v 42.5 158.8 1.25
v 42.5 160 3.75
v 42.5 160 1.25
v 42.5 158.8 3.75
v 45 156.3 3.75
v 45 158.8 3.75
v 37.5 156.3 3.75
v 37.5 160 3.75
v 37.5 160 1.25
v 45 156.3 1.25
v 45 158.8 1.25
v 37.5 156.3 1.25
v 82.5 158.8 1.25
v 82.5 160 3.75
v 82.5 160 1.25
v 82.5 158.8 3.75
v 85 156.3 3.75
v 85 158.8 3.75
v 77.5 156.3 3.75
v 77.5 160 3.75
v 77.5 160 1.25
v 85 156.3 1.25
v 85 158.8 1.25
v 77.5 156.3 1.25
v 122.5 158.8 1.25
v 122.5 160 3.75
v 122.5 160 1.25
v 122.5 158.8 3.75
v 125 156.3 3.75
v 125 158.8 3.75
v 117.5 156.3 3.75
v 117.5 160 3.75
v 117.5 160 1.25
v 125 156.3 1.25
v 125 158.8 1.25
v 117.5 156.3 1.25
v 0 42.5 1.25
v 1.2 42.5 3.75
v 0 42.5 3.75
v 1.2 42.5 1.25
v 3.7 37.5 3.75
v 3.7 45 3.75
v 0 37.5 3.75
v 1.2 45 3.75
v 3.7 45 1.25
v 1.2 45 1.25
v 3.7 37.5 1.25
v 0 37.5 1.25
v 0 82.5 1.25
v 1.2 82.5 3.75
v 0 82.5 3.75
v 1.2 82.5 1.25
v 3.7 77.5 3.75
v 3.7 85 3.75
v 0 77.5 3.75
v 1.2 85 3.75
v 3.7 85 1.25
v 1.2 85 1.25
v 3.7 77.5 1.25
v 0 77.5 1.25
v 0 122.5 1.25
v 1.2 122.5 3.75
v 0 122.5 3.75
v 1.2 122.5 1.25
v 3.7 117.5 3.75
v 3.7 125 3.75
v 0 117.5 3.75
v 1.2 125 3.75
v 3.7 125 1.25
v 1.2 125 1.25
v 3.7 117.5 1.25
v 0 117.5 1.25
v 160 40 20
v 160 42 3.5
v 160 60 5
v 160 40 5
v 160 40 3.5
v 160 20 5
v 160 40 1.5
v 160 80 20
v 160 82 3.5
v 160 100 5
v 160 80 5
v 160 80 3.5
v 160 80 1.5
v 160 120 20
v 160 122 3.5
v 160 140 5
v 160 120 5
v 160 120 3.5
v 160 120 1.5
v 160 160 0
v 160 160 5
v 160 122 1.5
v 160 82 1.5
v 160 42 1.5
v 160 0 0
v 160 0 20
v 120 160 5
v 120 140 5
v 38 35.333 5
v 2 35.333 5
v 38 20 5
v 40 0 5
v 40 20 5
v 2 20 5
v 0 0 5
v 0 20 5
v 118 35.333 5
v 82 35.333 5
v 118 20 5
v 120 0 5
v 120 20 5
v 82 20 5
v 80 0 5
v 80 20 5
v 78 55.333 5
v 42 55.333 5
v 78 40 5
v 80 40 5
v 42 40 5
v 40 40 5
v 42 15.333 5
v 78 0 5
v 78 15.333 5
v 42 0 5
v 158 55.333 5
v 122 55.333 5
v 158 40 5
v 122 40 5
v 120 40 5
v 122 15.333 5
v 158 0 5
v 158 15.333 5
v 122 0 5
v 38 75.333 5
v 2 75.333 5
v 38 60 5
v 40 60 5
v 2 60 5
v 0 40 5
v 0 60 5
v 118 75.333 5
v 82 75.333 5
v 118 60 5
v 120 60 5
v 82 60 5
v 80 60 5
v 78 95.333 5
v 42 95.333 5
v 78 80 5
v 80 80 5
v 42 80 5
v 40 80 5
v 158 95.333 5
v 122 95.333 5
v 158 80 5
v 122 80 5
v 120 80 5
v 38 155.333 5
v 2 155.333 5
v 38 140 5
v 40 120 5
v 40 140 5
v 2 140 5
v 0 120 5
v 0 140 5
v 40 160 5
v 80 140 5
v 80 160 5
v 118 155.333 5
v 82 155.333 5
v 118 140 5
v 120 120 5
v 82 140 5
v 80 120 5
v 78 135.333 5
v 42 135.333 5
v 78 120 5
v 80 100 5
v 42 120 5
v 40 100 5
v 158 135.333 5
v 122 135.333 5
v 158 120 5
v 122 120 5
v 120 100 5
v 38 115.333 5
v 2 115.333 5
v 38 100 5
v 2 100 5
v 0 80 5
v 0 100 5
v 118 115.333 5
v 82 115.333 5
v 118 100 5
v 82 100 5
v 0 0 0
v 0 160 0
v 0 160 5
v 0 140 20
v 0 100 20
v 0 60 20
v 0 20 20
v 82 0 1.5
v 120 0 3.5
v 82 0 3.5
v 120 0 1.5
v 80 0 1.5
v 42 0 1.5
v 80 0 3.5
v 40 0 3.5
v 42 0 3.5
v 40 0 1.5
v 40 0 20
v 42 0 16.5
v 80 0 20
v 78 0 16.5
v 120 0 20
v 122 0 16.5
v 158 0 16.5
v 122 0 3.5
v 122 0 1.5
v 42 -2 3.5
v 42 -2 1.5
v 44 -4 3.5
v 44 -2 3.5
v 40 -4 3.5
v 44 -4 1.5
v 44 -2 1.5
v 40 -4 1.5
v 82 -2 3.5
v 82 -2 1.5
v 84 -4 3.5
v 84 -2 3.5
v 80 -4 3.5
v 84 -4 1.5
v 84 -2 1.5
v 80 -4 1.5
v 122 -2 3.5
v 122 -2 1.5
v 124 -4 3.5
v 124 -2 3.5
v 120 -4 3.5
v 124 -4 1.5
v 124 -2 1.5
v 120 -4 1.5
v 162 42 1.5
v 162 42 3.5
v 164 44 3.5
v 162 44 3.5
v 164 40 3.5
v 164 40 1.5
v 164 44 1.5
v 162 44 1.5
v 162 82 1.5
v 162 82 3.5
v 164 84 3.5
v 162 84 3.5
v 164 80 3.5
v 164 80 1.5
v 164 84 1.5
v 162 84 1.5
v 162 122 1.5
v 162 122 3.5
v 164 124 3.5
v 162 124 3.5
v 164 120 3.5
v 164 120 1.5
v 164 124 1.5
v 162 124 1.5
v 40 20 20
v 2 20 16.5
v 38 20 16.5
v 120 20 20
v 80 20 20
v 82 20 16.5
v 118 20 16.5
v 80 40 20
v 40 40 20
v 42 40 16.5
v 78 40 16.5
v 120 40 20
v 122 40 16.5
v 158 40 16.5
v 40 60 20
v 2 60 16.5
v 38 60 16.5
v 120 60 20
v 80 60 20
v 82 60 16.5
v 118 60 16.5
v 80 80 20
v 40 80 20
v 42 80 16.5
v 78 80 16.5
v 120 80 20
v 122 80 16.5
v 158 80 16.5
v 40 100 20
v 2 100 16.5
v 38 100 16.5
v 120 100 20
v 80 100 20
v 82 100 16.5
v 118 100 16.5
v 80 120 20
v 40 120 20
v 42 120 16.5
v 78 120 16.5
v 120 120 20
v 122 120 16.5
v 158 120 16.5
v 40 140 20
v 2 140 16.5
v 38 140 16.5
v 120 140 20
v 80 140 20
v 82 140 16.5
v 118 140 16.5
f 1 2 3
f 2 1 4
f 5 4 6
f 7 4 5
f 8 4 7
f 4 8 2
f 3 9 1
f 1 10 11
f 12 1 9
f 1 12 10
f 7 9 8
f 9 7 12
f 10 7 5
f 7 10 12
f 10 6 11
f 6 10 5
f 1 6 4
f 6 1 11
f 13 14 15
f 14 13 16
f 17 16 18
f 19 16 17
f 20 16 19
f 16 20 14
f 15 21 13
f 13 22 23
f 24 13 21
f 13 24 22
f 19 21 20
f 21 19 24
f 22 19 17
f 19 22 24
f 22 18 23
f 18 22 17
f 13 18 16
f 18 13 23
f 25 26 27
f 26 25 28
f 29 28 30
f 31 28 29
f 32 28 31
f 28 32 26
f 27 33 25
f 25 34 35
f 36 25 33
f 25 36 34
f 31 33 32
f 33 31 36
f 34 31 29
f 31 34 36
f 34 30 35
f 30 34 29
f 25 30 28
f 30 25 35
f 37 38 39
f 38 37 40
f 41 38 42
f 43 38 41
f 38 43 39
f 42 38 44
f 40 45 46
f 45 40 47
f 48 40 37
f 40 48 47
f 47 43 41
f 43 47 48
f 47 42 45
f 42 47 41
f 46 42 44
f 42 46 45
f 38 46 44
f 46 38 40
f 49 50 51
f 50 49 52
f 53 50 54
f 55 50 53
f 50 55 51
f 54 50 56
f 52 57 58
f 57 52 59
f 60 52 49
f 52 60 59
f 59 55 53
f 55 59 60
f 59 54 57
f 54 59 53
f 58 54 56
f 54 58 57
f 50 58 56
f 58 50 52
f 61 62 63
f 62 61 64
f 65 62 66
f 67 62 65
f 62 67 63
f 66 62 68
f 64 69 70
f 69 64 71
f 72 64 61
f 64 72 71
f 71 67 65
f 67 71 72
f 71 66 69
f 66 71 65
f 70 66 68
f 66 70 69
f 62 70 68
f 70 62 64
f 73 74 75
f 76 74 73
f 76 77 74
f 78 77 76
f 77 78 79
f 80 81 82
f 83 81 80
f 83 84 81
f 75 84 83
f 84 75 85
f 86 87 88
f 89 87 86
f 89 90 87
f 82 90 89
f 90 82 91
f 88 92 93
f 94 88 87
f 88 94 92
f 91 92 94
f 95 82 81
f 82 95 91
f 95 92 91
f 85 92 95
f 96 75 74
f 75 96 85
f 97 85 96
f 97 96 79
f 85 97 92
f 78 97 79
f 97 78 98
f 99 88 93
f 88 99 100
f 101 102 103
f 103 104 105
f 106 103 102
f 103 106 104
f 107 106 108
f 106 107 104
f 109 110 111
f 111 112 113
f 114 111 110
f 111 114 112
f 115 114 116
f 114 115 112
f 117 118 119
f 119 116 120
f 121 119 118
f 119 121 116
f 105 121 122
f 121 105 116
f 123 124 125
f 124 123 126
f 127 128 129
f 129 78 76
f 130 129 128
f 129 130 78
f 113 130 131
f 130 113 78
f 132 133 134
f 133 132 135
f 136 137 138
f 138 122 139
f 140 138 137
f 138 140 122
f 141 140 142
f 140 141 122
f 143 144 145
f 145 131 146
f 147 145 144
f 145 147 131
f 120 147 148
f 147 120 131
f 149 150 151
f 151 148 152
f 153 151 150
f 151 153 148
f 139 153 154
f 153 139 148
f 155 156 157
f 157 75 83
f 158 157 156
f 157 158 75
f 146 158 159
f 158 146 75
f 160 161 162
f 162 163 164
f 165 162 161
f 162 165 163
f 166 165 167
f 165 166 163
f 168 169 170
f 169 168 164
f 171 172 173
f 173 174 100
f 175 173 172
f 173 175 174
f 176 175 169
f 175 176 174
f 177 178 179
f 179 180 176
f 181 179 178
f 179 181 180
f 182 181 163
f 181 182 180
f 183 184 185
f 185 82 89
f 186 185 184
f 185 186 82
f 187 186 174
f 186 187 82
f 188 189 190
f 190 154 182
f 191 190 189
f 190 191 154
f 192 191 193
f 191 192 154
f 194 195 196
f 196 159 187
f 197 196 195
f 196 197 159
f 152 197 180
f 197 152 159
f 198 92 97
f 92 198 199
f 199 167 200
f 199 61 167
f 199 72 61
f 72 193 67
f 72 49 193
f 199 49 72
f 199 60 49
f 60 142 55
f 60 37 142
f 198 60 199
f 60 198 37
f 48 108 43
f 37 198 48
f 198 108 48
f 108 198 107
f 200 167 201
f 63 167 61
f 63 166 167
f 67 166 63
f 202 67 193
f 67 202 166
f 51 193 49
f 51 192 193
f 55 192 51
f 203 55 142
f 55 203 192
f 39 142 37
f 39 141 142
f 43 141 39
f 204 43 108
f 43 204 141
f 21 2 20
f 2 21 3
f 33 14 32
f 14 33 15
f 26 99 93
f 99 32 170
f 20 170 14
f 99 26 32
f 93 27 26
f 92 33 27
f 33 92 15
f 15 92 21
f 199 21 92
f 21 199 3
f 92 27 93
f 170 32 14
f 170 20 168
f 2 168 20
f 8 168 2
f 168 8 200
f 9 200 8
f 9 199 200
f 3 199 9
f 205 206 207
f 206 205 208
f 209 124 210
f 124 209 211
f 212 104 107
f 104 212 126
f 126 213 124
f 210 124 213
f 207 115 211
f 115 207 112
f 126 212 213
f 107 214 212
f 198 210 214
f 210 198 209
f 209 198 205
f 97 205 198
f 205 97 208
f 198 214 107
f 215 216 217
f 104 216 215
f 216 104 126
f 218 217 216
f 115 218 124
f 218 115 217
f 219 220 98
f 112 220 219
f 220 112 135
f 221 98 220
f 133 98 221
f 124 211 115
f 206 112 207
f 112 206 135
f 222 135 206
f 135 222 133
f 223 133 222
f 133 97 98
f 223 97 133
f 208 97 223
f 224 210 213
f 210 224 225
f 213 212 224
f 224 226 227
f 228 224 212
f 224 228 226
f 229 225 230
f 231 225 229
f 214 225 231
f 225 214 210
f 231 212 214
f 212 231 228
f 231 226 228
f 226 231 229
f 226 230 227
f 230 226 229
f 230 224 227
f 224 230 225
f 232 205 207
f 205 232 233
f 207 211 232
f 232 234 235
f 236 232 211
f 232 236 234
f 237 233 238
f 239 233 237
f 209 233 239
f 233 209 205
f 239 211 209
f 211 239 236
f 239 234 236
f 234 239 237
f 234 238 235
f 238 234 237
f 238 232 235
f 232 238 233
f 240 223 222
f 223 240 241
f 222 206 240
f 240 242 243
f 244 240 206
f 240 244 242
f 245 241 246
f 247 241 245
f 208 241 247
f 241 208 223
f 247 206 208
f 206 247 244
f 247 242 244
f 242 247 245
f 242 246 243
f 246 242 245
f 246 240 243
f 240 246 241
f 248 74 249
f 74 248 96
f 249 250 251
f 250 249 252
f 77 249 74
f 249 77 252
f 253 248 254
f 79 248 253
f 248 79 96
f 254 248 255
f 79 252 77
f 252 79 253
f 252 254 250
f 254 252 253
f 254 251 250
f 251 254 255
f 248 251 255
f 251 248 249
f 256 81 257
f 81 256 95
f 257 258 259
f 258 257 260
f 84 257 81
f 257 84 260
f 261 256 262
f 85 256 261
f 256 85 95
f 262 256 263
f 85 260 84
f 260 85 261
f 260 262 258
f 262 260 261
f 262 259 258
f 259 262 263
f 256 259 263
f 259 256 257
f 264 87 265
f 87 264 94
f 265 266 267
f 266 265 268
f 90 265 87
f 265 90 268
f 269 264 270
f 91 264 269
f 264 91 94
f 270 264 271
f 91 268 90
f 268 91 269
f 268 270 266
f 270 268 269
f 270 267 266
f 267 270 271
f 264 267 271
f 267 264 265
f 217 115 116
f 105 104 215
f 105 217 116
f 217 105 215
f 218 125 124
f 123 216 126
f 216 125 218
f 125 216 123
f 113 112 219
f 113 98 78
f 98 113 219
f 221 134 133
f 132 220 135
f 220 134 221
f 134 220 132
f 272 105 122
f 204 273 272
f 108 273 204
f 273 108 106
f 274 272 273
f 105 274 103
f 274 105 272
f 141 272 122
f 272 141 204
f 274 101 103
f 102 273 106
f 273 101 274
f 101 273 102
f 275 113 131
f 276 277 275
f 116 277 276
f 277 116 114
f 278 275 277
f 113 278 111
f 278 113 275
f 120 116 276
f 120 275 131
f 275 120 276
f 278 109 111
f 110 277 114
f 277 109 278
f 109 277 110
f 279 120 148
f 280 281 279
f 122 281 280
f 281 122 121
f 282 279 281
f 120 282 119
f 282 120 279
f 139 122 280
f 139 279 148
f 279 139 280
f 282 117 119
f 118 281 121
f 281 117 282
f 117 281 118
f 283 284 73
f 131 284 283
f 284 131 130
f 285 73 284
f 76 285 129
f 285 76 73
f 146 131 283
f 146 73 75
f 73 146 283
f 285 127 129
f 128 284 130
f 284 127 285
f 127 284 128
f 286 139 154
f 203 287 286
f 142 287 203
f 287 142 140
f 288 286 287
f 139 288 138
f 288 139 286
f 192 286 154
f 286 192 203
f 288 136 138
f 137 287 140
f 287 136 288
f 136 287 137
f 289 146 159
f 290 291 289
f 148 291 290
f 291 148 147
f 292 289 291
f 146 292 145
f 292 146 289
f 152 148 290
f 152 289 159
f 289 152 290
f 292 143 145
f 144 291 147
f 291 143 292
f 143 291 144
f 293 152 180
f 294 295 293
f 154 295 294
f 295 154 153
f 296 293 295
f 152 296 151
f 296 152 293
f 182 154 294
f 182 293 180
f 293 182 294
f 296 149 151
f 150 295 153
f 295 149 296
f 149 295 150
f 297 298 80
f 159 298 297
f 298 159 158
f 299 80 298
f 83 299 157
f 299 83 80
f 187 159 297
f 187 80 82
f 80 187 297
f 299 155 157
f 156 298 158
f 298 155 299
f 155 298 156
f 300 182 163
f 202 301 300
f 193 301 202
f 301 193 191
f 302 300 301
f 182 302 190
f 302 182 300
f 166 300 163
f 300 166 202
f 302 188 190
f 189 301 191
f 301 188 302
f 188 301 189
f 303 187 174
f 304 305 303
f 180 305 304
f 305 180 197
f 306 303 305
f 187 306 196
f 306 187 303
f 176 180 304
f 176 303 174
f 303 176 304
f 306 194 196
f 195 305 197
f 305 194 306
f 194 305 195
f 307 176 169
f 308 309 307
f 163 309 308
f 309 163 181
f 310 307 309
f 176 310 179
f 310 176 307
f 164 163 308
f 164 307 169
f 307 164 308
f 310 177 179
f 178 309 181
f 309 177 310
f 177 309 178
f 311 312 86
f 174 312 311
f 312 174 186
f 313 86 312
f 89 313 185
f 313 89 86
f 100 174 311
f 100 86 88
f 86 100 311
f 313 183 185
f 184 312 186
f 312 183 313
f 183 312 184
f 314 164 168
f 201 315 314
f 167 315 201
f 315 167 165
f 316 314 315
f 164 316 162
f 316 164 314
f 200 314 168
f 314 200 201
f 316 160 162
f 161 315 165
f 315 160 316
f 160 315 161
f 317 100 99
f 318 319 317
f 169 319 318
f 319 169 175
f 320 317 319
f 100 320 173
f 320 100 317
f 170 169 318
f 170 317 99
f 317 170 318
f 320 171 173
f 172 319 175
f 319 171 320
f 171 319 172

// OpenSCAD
/* [Wall] */
wallWidth = 160;
wallHeight = 160;

/* [Wall parts] */
wallPartWidth = 160;
assert(wallPartWidth > 0 && wallPartWidth <= wallWidth);
wallPartHeight = 160;
assert(wallPartHeight > 0 && wallPartHeight <= wallHeight);
wallPartThickness = 5;
assert(wallPartThickness > 0);

/* [Plant box] */
plantBoxWidth = 40;
plantBoxHeight = 20;
plantBoxDepth = 15;
plantBoxWallThickness = 2;

/* Edges  */
edgePartSize = [
	wallWidth - floor(wallWidth/wallPartWidth) * wallPartWidth,
	wallHeight - floor(wallHeight/wallPartHeight) * wallPartHeight,
	wallPartThickness
];

/* [Hooks] */
edgeNumberOfXHooks = wallPartWidth/edgePartSize[0] > 4 ? 1 : (wallPartWidth/edgePartSize[0] > 2 ? 2 : 3);
edgeNumberOfYHooks = wallPartHeight/edgePartSize[1] > 4 ? 1 : (wallPartHeight/edgePartSize[1] > 2 ? 2 : 3);


hookWidth = 4;
assert(hookWidth > 0 && hookWidth < wallPartWidth/4 && hookWidth < wallPartHeight/4);
hookHeight = 4;
assert(hookHeight > 0);
hookThickness = 2;
assert(hookThickness < wallPartThickness);
hookFitSpacingRate = 1.25;
hookWallSpacingRate = 0.925;
assert(
	hookThickness * hookFitSpacingRate < wallPartThickness &&
	hookWidth * hookFitSpacingRate < wallPartWidth/(edgeNumberOfXHooks + 1) &&
	hookHeight * hookFitSpacingRate < wallPartHeight/(edgeNumberOfXHooks + 1)
);
wallPartNumberOfXHooks = 3;
assert(wallPartNumberOfXHooks > 0);
wallPartNumberOfYHooks = 3;
assert(wallPartNumberOfYHooks > 0);


/* [Edges] */
assert(edgePartSize[0] == 0 || (edgePartSize[0] > hookWidth && edgePartSize[0] > hookHeight));
assert(edgePartSize[1] == 0 || (edgePartSize[1] > hookWidth && edgePartSize[1] > hookHeight));

// Spacing between wall parts
wallPartSpacing = hookHeight * 2;
assert(hookHeight < wallPartSpacing);


for (yIndex = [0:floor(wallHeight/wallPartHeight) - 1]) {
	for(xIndex = [0:floor(wallWidth/wallPartWidth) - 1]) {
		translate([
			xIndex * (wallPartWidth + wallPartSpacing),
			yIndex * (wallPartHeight + wallPartSpacing),
			0
		])
		union() {
			difference() {
				// Wall part
				cube([
					wallPartWidth,
					wallPartHeight,
					wallPartThickness
				]);
				
				/* Inner Hook */
				// Hook X
				for (hookIndex = [1:wallPartNumberOfXHooks]) {
					translate([
						wallPartWidth / (wallPartNumberOfXHooks + 1) * hookIndex - (hookWidth * hookFitSpacingRate) / 2,
						wallPartHeight - hookHeight * hookWallSpacingRate,
						wallPartThickness/2 - (hookThickness*hookFitSpacingRate) / 2
					])
					scale([hookFitSpacingRate,hookFitSpacingRate,hookFitSpacingRate])
					union() {
						cube([
							hookWidth,
							hookHeight,
							hookThickness
						]);
						cube([
							hookWidth * 1.5,
							hookHeight/2,
							hookThickness
						]);
					}
				}
				// Hook Y
				for (hookIndex = [1:wallPartNumberOfYHooks]) {
					translate([
						hookHeight * hookWallSpacingRate,
						wallPartHeight / (wallPartNumberOfYHooks + 1) * hookIndex - (hookWidth * hookFitSpacingRate)/2,
						wallPartThickness/2 - (hookThickness * hookFitSpacingRate) / 2
					])
					scale([hookFitSpacingRate,hookFitSpacingRate,hookFitSpacingRate])
					rotate(90)
					union() {
						cube([
							hookWidth,
							hookHeight,
							hookThickness
						]);
						cube([
							hookWidth * 1.5,
							hookHeight/2,
							hookThickness
						]);
					}
				}
				
			}
			
			/* Outer Hook */
			// Hook X
			for (hookIndex = [1:wallPartNumberOfXHooks]) {
				translate([
					wallPartWidth / (wallPartNumberOfXHooks + 1) * hookIndex,
					-hookHeight,
					wallPartThickness/2 - hookThickness / 2
				])
				union() {
					cube([
						hookWidth/2,
						hookHeight,
						hookThickness
					]);
					cube([
						hookWidth,
						hookHeight/2,
						hookThickness
					]);
				}
			}
			// Hook Y
			for (hookIndex = [1:wallPartNumberOfYHooks]) {
				translate([
					wallPartWidth + hookHeight,
					wallPartHeight / (wallPartNumberOfYHooks + 1) * hookIndex,
					wallPartThickness/2 - hookThickness / 2
				])
				rotate(90)
				union() {
					cube([
						hookWidth/2,
						hookHeight,
						hookThickness
					]);
					cube([
						hookWidth,
						hookHeight/2,
						hookThickness
					]);
				}
			}
			
			// Plant Boxes
			yBoxesCount = floor(wallPartHeight / plantBoxHeight);
			xBoxesCount = floor(wallPartWidth / (plantBoxWidth * 2));
			for(rowBoxIndex = [0:yBoxesCount - 1]) {
				for(columnBoxIndex = [0:xBoxesCount - 1]) {
					xSpace = (wallPartWidth - plantBoxWidth * (xBoxesCount * 2)) / (xBoxesCount * 2);
					ySpace = (wallPartHeight - plantBoxHeight * yBoxesCount) / yBoxesCount;

					translate([
						(plantBoxWidth + xSpace) * columnBoxIndex * 2 + (rowBoxIndex % 2 == 0 ? plantBoxWidth + xSpace: 0) + xSpace/2 ,
						(plantBoxHeight + ySpace) * rowBoxIndex + ySpace/2,
						wallPartThickness
					])
					difference() {
//						cube([
//							plantBoxWidth,
//							plantBoxHeight,
//							plantBoxDepth
//						]);
						
						faces = [
						  [0,1,2,3],  // bottom
						  [4,5,1,0],  // front
						  [7,6,5,4],  // top
						  [5,6,2,1],  // right
						  [6,7,3,2],  // back
						  [7,4,0,3]
						 ];

						polyhedron(
							points=[
							  [0, 0, 0],
							  [plantBoxWidth, 0, 0],
							  [plantBoxWidth, plantBoxHeight, 0],
							  [0, plantBoxHeight, 0],
							  [0, 0, plantBoxDepth],
							  [plantBoxWidth, 0, plantBoxDepth],
							  [plantBoxWidth, 0, plantBoxDepth],
							  [0, 0, plantBoxDepth]
							],
							faces=faces
						);
						
						phW = plantBoxWidth - plantBoxWallThickness * 2;
						translate([
							plantBoxWallThickness,
							-plantBoxWallThickness,
							-plantBoxWallThickness
						])
						polyhedron(
							points=[
							  [0, 0, 0],
							  [phW, 0, 0],
							  [phW, plantBoxHeight, 0],
							  [0, plantBoxHeight, 0],
							  [0, 0, plantBoxDepth],
							  [phW, 0, plantBoxDepth],
							  [phW, 0, plantBoxDepth],
							  [0, 0, plantBoxDepth]
							],
							faces=faces
						);
						
//						translate([
//							plantBoxWallThickness,
//							0,
//							0
//						])
//						cube([
//							plantBoxWidth - plantBoxWallThickness * 2,
//							plantBoxHeight - plantBoxWallThickness * 2,
//							plantBoxDepth - plantBoxWallThickness
//						]);
						
						
					}
				}
			}
		}
	}
}

// Edge Parts Y
if (wallWidth % wallPartWidth != 0) {
	for (yIndex = [0:floor(wallHeight/wallPartHeight) - 1]) {
		partSize = [
			wallWidth - floor(wallWidth/wallPartWidth) * wallPartWidth,
			wallPartHeight,
			wallPartThickness
		];
		
		translate([-wallPartWidth,0,0])
		union() {
			difference() {
				translate([
					0,
					yIndex * (wallPartHeight + wallPartSpacing),
					0
				])
				cube(partSize);
				
				// Inner hook for wall parts
				for (hookIndex = [1:wallPartNumberOfYHooks]) {
					translate([
						hookHeight * hookWallSpacingRate,
						(wallPartHeight + wallPartSpacing) * yIndex + wallPartHeight / (wallPartNumberOfYHooks + 1) * hookIndex - (hookWidth * hookFitSpacingRate)/2,
						wallPartThickness/2 - (hookThickness * hookFitSpacingRate) / 2
					])
					scale([hookFitSpacingRate,hookFitSpacingRate,hookFitSpacingRate])
					rotate(90)
					union() {
						cube([
							hookWidth,
							hookHeight,
							hookThickness
						]);
						cube([
							hookWidth * 1.5,
							hookHeight/2,
							hookThickness
						]);
					}
				}
				
				// inner hook for edge part
				for (hookIndex = [1:edgeNumberOfXHooks]) {
					translate([
						partSize[0] / (edgeNumberOfXHooks + 1) * hookIndex - (hookWidth * hookFitSpacingRate) / 2,
						partSize[1] - hookHeight * hookWallSpacingRate,
						wallPartThickness/2 - (hookThickness*hookFitSpacingRate) / 2
					])
					scale([hookFitSpacingRate,hookFitSpacingRate,hookFitSpacingRate])
					union() {
						cube([
							hookWidth,
							hookHeight,
							hookThickness
						]);
						cube([
							hookWidth * 1.5,
							hookHeight/2,
							hookThickness
						]);
					}
				}
			}
			
			// Outer hook
			for (hookIndex = [1:edgeNumberOfXHooks]) {
				translate([
					partSize[0] / (edgeNumberOfXHooks + 1) * hookIndex,
					yIndex * (wallPartHeight + wallPartSpacing) + (-hookHeight),
					wallPartThickness/2 - hookThickness / 2
				])
				union() {
					cube([
						hookWidth/2,
						hookHeight,
						hookThickness
					]);
					cube([
						hookWidth,
						hookHeight/2,
						hookThickness
					]);
				}
			}
		}
	}
}

// Edge Parts X
if (wallHeight % wallPartHeight != 0) {
	for (xIndex = [0:floor(wallWidth/wallPartWidth) - 1]) {
		partSize = [
			wallPartWidth,
			wallHeight - floor(wallHeight/wallPartHeight) * wallPartHeight,
			wallPartThickness
		];
		
		translate([0,-wallPartHeight,0])
		union() {
			difference() {
				translate([
					xIndex * (wallPartWidth + wallPartSpacing),
					0,
					0
				])
				cube(partSize);

				// Inner hook X
				for (hookIndex = [1:wallPartNumberOfXHooks]) {
					translate([
						wallPartWidth / (wallPartNumberOfXHooks + 1) * hookIndex - hookWidth / 2 + xIndex * (wallPartWidth + wallPartSpacing),
						wallHeight - floor(wallHeight/wallPartHeight) * wallPartHeight - hookHeight * hookWallSpacingRate,
						wallPartThickness/2 - (hookThickness*hookFitSpacingRate) / 2
					])
					scale([hookFitSpacingRate,hookFitSpacingRate,hookFitSpacingRate])
					union() {
						cube([
							hookWidth,
							hookHeight,
							hookThickness
						]);
						cube([
							hookWidth * 1.5,
							hookHeight/2,
							hookThickness
						]);
					}
				}
				
				// Inner hook Y
				for (hookIndex = [1:edgeNumberOfYHooks]) {
					translate([
						(partSize[0] + wallPartSpacing) * xIndex + hookHeight * hookWallSpacingRate,
						partSize[1] / (edgeNumberOfYHooks + 1) * hookIndex - (hookWidth * hookFitSpacingRate)/2,
						wallPartThickness/2 - (hookThickness * hookFitSpacingRate) / 2
					])
					scale([hookFitSpacingRate,hookFitSpacingRate,hookFitSpacingRate])
					rotate(90)
					union() {
						cube([
							hookWidth,
							hookHeight,
							hookThickness
						]);
						cube([
							hookWidth * 1.5,
							hookHeight/2,
							hookThickness
						]);
					}
				}
			}
		
			// Outer hook X
			for (hookIndex = [1:edgeNumberOfYHooks]) {
				translate([
					(partSize[0] + wallPartSpacing) * xIndex + partSize[0] + hookHeight,
					partSize[1] / (edgeNumberOfYHooks + 1) * hookIndex,
					wallPartThickness/2 - hookThickness / 2
				])
				rotate(90)
				union() {
					cube([
						hookWidth/2,
						hookHeight,
						hookThickness
					]);
					cube([
						hookWidth,
						hookHeight/2,
						hookThickness
					]);
				}
			}
		}
	}
}

// Edge Part
if (wallHeight % wallPartHeight != 0 && wallWidth % wallPartWidth != 0) {
	
	translate([-wallPartWidth,-wallPartHeight,0])
	difference() {
		translate([
			0,
			0,
			0
		])
		cube(edgePartSize);

		// Inner Hook X
		if (wallWidth % wallPartWidth != 0) {
			for (hookIndex = [1:edgeNumberOfXHooks]) {
				translate([
					edgePartSize[0] / (edgeNumberOfXHooks + 1) * hookIndex - (hookWidth * hookFitSpacingRate) / 2,
					edgePartSize[1] - hookHeight * hookWallSpacingRate,
					wallPartThickness/2 - (hookThickness*hookFitSpacingRate) / 2
				])
				scale([hookFitSpacingRate,hookFitSpacingRate,hookFitSpacingRate])
				union() {
					cube([
						hookWidth,
						hookHeight,
						hookThickness
					]);
					cube([
						hookWidth * 1.5,
						hookHeight/2,
						hookThickness
					]);
				}
			}
		}
		// Inner Hook Y
		if (wallHeight % wallPartHeight != 0) {
			for (hookIndex = [1:edgeNumberOfYHooks]) {
				translate([
					hookHeight * hookWallSpacingRate,
					edgePartSize[1] / (edgeNumberOfYHooks + 1) * hookIndex - (hookWidth * hookFitSpacingRate) / 2,
					wallPartThickness/2 - (hookThickness*hookFitSpacingRate) / 2
				])
				scale([hookFitSpacingRate,hookFitSpacingRate,hookFitSpacingRate])
				rotate(90)
				union() {
					cube([
						hookWidth,
						hookHeight,
						hookThickness
					]);
					cube([
						hookWidth * 1.5,
						hookHeight/2,
						hookThickness
					]);
				}
			}
		}
	}
}

/*

TODO:
- okrajove dily dodelat
- sloty na rostliny

*/
